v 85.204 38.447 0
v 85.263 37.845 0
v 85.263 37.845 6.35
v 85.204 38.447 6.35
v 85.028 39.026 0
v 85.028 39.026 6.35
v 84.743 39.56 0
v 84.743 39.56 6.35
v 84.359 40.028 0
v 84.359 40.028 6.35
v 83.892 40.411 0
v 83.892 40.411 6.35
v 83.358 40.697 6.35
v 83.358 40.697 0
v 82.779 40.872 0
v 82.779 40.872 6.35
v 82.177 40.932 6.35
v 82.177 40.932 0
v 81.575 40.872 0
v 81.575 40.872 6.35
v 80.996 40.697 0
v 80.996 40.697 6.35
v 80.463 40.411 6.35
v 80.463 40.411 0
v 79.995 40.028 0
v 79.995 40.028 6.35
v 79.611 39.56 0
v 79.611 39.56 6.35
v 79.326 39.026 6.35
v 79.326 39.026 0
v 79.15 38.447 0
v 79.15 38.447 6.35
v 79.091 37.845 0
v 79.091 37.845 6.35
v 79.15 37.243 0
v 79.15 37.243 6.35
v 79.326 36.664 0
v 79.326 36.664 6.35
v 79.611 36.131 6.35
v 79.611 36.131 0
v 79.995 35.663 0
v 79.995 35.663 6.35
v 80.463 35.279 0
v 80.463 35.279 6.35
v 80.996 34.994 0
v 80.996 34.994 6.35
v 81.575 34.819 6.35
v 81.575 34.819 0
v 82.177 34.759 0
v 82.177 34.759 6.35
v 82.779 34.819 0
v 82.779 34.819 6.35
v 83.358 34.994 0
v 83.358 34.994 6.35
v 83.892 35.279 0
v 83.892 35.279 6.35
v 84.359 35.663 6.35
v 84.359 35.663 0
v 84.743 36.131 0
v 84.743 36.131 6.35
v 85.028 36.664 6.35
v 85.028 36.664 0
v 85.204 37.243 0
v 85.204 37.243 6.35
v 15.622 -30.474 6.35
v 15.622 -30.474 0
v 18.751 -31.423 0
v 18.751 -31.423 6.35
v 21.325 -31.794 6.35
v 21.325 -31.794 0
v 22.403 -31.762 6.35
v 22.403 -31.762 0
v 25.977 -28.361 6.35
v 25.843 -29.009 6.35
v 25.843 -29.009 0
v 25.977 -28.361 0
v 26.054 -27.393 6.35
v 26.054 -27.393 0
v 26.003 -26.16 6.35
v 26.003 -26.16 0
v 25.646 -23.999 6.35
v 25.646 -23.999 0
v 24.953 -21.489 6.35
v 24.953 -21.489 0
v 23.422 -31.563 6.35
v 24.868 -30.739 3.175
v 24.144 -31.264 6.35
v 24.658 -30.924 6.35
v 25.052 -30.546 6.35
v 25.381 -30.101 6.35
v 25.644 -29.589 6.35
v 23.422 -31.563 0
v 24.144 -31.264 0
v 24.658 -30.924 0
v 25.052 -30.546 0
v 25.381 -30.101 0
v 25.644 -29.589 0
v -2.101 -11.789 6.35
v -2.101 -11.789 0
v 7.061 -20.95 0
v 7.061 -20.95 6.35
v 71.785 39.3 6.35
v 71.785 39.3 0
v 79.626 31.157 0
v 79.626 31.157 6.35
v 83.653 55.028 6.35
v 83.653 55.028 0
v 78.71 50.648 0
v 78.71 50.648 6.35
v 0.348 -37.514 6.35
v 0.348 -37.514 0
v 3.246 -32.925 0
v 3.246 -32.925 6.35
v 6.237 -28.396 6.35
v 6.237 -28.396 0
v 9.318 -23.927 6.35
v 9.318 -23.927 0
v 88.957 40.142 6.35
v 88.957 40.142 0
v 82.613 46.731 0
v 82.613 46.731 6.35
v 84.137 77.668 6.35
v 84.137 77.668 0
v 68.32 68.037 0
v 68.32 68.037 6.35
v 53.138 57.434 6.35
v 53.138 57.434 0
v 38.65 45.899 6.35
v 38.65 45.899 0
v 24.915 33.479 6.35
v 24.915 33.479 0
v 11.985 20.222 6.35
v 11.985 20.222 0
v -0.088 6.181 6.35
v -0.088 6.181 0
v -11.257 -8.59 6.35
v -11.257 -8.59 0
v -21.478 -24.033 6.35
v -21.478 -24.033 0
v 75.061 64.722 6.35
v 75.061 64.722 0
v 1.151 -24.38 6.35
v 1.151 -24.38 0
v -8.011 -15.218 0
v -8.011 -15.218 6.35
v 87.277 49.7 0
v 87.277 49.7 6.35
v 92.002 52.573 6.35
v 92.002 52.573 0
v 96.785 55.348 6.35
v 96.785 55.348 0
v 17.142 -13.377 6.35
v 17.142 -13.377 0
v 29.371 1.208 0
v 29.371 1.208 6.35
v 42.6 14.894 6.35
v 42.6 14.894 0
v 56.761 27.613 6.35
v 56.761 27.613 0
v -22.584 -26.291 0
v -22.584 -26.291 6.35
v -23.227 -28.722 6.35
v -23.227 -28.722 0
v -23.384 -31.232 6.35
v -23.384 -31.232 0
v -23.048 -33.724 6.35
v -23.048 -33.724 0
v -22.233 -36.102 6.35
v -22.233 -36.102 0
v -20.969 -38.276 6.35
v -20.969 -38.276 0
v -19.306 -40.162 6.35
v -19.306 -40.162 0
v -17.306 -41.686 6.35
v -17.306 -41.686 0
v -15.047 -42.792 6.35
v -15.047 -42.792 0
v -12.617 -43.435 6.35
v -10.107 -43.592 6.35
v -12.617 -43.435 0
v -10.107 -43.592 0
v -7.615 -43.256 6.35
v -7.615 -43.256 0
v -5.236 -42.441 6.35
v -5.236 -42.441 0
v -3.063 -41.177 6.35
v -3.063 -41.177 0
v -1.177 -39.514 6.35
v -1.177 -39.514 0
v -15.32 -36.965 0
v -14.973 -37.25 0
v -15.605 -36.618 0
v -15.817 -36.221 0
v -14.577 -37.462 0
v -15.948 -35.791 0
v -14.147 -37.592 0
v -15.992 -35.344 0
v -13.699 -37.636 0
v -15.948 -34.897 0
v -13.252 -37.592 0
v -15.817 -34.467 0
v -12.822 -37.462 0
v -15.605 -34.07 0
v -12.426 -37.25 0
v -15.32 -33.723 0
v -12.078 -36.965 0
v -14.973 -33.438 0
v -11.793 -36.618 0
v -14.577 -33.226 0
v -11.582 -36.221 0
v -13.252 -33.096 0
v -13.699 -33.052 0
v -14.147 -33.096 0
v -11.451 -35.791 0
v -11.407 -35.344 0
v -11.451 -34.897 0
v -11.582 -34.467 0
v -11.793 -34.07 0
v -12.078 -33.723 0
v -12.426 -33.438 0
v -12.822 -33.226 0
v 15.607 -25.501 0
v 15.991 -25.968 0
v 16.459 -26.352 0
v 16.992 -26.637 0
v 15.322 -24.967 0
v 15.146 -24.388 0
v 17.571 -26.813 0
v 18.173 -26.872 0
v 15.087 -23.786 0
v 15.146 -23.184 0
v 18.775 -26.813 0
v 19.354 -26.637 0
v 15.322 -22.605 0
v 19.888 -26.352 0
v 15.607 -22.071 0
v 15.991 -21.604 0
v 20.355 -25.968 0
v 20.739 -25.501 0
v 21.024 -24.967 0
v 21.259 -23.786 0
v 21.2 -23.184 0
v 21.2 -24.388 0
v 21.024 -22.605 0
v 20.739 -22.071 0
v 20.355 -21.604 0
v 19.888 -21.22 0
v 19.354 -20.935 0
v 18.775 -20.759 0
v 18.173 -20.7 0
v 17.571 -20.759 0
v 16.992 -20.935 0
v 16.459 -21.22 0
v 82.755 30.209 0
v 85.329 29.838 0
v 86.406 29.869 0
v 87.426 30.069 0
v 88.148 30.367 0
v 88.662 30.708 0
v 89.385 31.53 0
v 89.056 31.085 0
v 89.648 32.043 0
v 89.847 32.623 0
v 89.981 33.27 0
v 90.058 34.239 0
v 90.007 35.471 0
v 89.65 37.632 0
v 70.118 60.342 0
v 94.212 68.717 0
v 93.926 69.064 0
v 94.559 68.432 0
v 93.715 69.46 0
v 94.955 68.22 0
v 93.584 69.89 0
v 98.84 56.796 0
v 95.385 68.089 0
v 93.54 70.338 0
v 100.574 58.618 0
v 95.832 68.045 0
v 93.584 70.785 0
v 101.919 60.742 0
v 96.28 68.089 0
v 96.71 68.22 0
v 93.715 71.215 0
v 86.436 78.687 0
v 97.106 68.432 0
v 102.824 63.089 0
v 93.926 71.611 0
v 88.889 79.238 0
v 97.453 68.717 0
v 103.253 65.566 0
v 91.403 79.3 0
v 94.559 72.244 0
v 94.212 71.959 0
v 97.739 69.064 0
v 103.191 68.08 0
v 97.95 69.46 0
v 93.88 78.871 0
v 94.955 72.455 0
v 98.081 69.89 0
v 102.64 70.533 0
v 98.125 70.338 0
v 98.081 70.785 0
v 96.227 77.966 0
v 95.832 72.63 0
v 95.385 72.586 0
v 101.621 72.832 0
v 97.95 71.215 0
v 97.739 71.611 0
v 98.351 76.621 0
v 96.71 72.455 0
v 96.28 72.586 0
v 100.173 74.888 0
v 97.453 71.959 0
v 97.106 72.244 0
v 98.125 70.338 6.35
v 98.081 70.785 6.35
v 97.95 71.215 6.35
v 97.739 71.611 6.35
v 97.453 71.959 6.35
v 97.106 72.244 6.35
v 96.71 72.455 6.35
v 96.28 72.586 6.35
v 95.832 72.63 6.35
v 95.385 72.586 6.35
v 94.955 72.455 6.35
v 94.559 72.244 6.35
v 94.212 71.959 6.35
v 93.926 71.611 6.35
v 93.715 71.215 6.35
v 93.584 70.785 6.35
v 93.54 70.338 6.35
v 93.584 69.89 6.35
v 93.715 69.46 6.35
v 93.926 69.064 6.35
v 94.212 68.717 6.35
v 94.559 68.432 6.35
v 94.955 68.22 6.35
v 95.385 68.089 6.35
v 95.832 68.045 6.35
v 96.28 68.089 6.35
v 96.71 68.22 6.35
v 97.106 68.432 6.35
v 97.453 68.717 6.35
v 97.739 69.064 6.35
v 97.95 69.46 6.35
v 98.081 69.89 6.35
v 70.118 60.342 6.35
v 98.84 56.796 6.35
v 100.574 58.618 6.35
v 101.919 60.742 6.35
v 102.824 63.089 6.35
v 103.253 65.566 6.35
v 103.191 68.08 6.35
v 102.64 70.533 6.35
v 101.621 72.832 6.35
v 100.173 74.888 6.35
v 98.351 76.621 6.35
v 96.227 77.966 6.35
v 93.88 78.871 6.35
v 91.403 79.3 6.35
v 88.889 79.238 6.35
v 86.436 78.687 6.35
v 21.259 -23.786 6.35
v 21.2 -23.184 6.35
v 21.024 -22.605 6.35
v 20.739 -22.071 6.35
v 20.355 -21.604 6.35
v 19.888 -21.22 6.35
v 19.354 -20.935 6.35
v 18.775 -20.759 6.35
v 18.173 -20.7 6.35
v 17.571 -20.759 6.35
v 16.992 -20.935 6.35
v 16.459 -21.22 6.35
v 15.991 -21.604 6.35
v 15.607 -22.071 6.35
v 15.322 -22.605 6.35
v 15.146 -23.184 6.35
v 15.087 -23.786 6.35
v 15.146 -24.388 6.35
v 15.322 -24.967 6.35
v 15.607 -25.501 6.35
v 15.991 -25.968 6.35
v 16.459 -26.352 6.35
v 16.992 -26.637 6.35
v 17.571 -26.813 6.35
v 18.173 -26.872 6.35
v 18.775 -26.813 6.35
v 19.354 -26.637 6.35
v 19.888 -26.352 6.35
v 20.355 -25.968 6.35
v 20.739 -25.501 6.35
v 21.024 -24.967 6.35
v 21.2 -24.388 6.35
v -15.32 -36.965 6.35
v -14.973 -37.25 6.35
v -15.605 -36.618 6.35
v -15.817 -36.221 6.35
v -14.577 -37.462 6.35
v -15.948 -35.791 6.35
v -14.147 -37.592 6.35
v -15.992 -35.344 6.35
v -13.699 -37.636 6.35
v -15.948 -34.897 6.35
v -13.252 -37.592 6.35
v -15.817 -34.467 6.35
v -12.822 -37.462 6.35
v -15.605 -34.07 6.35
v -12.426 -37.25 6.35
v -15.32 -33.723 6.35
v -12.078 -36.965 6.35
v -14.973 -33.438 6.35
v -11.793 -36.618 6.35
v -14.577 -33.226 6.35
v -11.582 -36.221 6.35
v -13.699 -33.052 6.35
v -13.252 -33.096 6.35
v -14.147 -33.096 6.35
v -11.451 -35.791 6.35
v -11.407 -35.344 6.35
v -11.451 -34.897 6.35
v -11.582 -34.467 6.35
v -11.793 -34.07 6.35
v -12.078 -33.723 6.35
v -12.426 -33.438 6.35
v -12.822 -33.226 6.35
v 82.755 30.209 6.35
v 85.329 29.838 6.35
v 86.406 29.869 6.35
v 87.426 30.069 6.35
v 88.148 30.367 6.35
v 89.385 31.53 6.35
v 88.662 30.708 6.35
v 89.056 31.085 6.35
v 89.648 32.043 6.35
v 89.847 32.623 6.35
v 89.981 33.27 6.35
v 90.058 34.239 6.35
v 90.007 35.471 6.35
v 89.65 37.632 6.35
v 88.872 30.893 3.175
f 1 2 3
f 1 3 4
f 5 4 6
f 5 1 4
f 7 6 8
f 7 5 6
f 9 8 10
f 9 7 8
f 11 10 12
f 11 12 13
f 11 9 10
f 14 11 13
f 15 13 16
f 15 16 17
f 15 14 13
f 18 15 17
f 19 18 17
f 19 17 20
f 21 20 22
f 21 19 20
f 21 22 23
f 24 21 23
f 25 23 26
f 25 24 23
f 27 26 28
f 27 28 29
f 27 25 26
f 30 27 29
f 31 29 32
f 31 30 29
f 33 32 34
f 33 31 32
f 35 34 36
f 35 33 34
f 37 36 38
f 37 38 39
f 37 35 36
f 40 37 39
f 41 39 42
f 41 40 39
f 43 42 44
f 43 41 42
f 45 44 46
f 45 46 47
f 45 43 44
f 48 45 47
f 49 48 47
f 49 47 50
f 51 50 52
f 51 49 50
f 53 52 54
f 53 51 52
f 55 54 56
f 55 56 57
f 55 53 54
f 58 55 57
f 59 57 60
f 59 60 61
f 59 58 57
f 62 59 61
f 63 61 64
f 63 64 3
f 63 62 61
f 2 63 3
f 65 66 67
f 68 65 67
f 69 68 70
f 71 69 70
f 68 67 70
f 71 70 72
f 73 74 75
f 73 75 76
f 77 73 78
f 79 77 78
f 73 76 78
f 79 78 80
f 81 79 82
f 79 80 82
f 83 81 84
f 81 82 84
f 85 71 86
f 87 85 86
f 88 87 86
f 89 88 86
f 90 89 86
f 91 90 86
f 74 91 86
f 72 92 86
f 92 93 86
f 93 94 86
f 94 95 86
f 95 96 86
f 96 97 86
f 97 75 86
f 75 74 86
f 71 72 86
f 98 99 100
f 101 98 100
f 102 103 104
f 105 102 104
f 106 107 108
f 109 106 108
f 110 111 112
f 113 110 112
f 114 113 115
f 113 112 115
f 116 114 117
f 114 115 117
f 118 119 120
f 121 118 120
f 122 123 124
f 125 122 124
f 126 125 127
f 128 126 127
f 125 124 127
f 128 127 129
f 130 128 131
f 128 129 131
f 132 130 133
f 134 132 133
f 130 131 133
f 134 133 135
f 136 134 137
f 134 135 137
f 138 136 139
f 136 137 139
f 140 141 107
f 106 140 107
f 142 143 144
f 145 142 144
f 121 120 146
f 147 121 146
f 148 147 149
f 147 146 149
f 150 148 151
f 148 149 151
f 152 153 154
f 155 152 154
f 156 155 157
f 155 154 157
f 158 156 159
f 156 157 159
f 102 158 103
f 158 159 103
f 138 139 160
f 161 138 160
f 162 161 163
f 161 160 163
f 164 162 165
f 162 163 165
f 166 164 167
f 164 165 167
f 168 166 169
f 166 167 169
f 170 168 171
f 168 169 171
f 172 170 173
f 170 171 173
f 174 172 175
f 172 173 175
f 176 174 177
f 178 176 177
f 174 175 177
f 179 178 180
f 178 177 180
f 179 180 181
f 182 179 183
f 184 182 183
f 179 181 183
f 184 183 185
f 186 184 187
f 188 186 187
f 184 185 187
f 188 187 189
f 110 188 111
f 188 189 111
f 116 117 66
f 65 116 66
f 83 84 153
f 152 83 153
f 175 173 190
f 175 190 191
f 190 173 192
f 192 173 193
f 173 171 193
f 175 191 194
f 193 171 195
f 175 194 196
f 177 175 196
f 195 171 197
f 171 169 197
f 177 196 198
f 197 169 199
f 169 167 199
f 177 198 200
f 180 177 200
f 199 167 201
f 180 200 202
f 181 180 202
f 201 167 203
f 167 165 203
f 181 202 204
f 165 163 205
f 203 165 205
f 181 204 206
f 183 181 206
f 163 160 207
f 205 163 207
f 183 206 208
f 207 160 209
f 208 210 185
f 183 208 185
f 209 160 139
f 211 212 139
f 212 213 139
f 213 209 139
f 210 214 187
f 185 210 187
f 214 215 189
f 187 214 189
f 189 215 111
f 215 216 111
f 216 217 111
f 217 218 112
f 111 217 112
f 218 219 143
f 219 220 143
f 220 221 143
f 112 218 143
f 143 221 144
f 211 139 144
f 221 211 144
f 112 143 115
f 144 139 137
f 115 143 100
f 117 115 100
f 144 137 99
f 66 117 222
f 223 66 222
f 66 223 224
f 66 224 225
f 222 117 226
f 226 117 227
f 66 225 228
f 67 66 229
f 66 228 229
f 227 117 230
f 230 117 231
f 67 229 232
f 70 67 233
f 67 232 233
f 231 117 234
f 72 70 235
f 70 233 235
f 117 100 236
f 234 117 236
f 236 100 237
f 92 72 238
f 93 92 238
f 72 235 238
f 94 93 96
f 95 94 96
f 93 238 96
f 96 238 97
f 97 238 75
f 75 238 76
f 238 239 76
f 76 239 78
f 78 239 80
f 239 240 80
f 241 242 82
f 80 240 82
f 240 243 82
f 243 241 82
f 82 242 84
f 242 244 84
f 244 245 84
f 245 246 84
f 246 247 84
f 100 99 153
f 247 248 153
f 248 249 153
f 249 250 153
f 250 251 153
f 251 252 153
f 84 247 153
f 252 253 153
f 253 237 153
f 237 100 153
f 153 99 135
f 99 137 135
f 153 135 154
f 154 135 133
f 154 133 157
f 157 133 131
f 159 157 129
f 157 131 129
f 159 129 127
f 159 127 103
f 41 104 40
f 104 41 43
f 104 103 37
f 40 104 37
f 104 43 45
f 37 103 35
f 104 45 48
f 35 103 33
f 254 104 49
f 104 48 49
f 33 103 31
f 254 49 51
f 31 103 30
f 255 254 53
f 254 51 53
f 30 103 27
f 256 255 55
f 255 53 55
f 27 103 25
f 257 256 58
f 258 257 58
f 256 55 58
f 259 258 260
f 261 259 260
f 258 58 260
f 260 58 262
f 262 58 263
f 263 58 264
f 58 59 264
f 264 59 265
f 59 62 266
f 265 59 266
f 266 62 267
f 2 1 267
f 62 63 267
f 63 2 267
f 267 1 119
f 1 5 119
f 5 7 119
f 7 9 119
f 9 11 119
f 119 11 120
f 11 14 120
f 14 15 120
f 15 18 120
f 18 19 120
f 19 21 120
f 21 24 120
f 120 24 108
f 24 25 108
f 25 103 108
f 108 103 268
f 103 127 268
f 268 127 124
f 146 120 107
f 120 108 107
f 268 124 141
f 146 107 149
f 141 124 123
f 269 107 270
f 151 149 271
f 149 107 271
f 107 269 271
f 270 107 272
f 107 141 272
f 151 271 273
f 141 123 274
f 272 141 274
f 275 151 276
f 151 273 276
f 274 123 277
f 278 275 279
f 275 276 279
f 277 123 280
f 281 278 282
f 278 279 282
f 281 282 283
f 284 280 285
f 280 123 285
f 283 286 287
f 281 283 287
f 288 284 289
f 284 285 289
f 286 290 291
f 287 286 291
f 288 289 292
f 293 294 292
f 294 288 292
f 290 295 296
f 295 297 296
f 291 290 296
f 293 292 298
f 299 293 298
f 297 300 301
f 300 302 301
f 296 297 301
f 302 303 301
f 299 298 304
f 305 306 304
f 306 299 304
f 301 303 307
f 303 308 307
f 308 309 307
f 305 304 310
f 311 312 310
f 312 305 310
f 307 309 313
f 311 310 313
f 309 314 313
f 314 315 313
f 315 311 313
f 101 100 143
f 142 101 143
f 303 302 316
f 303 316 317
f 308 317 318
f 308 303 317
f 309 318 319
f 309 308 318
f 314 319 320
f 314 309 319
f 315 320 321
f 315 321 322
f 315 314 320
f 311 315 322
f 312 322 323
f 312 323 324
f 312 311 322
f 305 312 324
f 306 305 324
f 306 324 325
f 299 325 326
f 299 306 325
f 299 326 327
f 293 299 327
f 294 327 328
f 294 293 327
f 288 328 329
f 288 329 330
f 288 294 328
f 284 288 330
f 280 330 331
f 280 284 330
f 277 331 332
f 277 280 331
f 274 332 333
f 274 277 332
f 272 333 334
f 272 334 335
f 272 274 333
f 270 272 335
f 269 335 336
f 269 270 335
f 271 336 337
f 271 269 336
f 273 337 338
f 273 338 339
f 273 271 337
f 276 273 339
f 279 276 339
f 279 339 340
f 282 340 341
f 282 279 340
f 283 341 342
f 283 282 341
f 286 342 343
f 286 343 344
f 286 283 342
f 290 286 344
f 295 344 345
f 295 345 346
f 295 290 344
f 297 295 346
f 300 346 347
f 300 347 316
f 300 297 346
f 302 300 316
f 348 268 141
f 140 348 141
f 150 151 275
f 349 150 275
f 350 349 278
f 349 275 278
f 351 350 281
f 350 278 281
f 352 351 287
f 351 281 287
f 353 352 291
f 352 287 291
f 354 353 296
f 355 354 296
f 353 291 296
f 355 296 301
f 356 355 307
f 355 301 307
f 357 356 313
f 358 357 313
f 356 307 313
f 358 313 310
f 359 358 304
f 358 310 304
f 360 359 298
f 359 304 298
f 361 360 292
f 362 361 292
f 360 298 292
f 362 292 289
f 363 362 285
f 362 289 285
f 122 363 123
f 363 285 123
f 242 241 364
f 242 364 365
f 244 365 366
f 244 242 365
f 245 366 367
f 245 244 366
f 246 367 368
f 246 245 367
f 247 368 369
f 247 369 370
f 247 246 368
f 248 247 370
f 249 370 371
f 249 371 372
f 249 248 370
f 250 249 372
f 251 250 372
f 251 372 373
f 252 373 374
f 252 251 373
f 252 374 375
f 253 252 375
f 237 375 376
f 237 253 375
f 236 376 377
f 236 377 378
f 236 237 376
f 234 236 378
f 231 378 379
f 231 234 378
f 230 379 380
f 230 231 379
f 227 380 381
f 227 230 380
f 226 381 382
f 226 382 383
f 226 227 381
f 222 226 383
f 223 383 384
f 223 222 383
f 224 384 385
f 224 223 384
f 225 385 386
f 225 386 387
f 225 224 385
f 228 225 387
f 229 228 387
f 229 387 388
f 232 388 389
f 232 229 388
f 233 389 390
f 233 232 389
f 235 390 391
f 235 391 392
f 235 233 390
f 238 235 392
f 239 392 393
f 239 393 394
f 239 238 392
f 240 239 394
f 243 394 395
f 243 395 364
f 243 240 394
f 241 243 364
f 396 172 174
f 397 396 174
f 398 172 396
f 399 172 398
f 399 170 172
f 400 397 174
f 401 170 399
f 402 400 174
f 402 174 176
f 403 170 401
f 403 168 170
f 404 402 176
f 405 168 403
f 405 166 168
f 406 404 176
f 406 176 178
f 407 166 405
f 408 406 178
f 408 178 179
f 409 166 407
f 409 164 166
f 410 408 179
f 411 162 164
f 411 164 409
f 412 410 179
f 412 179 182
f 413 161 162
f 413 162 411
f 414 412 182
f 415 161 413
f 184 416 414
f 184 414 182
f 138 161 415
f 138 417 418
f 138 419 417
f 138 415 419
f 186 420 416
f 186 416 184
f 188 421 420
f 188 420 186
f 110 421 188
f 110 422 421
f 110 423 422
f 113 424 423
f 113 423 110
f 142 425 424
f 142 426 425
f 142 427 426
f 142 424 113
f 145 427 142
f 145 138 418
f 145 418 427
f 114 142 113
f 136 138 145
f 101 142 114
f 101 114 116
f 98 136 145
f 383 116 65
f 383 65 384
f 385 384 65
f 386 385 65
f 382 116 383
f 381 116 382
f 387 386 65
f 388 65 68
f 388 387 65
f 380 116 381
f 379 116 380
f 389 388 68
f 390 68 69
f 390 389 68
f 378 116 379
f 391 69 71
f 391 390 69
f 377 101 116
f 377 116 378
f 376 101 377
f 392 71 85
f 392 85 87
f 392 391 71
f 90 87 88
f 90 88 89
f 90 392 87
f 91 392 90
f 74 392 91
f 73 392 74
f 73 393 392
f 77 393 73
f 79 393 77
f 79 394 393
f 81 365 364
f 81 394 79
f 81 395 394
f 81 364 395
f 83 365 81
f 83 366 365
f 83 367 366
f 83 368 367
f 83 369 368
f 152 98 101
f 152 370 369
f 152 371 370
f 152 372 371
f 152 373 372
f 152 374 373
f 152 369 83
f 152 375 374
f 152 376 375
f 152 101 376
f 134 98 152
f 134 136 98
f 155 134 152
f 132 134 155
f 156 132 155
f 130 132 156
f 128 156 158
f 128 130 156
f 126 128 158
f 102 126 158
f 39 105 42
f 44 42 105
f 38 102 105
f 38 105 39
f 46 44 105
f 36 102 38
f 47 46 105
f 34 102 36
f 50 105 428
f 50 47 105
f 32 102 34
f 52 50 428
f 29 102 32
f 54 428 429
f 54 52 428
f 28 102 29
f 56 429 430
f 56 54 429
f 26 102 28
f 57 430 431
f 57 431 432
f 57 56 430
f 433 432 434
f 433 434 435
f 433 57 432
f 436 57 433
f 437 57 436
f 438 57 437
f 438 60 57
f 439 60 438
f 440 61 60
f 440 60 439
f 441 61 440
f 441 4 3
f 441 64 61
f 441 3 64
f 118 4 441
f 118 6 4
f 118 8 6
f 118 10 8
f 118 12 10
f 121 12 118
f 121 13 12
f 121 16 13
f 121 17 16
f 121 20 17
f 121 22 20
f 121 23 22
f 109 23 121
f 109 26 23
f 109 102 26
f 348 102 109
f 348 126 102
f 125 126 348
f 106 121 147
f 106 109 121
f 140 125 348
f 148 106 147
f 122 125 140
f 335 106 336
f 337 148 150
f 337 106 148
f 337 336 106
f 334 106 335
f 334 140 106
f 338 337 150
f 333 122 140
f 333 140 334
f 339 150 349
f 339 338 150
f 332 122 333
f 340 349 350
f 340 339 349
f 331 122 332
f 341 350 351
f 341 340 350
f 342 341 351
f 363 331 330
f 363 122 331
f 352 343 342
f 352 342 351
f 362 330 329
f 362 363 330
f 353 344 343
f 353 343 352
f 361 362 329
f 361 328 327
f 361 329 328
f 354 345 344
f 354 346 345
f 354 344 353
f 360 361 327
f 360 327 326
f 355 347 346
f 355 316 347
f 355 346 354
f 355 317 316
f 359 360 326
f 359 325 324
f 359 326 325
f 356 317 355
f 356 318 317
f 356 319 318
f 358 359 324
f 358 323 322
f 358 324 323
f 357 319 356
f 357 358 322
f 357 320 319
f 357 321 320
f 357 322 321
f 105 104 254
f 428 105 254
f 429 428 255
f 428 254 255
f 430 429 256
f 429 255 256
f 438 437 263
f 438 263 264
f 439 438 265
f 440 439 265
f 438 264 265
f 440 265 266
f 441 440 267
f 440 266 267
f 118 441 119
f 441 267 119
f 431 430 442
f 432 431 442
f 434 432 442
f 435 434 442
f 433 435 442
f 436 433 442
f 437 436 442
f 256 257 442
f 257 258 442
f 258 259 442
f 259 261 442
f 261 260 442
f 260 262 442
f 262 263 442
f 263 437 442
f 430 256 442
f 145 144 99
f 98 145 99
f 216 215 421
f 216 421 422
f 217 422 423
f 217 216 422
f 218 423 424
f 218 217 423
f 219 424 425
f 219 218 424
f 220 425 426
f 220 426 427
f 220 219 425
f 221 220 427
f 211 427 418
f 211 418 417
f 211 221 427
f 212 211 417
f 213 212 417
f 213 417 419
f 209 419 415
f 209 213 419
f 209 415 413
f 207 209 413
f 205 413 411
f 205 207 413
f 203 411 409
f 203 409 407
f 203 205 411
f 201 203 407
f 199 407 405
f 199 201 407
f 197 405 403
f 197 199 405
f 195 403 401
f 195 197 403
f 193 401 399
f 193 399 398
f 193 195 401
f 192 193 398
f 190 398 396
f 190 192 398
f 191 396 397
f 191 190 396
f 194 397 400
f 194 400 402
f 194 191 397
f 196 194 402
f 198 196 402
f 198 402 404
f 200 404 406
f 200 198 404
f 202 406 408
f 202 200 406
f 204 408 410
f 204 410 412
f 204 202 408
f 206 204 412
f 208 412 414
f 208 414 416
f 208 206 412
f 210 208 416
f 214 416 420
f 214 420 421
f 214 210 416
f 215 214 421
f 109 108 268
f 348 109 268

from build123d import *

# Parameters (mm, degrees)
SKETCH1_R           = 3.0861
SKETCH1_R_2         = 2.29235
BOSS_EXTRUDE1_DEPTH = 6.35


with BuildPart() as part:
    # Sketch1 → Boss-Extrude1 (new body)
    with BuildSketch(Plane.XY):
        with BuildLine():
            Line((9.317684399, -23.927461165), (15.621766017, -30.474222957))
            add(Edge.make_bspline(
                [(15.621766017, -30.474222957), (29.448816856, -35.495722543), (24.952941844, -21.488942011)],
                knots=[0, 0, 0, 1, 1, 1], degree=2))
            Line((24.952941844, -21.488942011), (17.141687262, -13.376987542))
            ThreePointArc((17.141687262, -13.376987542), (42.59986543, 14.894415901), (71.784823307, 39.299934171))
            Line((71.784823307, 39.299934171), (79.625725522, 31.157190761))
            add(Edge.make_bspline(
                [(79.625725522, 31.157190761), (93.452776362, 26.135691176), (88.956901349, 40.142471708)],
                knots=[0, 0, 0, 1, 1, 1], degree=2))
            Line((88.956901349, 40.142471708), (82.612726668, 46.730869976))
            ThreePointArc((82.612726668, 46.730869976), (89.632476194, 51.148612181), (96.784823972, 55.348284892))
            ThreePointArc((96.784823972, 55.348284892), (101.62072272, 72.831932717), (84.137074895, 77.667831466))
            ThreePointArc((84.137074895, 77.667831466), (24.914787096, 33.479112567), (-21.478374368, -24.032597715))
            ThreePointArc((-21.478374368, -24.032597715), (-17.306021838, -41.68636027), (0.347740718, -37.51400774))
            ThreePointArc((0.347740718, -37.51400774), (4.730111543, -30.652996464), (9.317684399, -23.927461165))
        make_face()
        with Locations((18.173165644, -23.786006993)):
            Circle(SKETCH1_R, mode=Mode.SUBTRACT)
        with Locations((95.832484441, 70.337620248)):
            Circle(SKETCH1_R_2, mode=Mode.SUBTRACT)
        with Locations((-13.699424668, -35.344042378)):
            Circle(SKETCH1_R_2, mode=Mode.SUBTRACT)
        Polygon((-8.010879952, -15.218201264), (-2.100930482, -11.788684368), (7.060562914, -20.950177765), (1.150613445, -24.379694661), align=None, mode=Mode.SUBTRACT)
        Polygon((70.118447134, 60.342279832), (75.060785804, 64.722474401), (83.652705921, 55.027887008), (78.71036725, 50.647692439), align=None, mode=Mode.SUBTRACT)
        with Locations((82.177125837, 37.84540285)):
            Circle(SKETCH1_R, mode=Mode.SUBTRACT)
    extrude(amount=BOSS_EXTRUDE1_DEPTH)


solid = part.part
